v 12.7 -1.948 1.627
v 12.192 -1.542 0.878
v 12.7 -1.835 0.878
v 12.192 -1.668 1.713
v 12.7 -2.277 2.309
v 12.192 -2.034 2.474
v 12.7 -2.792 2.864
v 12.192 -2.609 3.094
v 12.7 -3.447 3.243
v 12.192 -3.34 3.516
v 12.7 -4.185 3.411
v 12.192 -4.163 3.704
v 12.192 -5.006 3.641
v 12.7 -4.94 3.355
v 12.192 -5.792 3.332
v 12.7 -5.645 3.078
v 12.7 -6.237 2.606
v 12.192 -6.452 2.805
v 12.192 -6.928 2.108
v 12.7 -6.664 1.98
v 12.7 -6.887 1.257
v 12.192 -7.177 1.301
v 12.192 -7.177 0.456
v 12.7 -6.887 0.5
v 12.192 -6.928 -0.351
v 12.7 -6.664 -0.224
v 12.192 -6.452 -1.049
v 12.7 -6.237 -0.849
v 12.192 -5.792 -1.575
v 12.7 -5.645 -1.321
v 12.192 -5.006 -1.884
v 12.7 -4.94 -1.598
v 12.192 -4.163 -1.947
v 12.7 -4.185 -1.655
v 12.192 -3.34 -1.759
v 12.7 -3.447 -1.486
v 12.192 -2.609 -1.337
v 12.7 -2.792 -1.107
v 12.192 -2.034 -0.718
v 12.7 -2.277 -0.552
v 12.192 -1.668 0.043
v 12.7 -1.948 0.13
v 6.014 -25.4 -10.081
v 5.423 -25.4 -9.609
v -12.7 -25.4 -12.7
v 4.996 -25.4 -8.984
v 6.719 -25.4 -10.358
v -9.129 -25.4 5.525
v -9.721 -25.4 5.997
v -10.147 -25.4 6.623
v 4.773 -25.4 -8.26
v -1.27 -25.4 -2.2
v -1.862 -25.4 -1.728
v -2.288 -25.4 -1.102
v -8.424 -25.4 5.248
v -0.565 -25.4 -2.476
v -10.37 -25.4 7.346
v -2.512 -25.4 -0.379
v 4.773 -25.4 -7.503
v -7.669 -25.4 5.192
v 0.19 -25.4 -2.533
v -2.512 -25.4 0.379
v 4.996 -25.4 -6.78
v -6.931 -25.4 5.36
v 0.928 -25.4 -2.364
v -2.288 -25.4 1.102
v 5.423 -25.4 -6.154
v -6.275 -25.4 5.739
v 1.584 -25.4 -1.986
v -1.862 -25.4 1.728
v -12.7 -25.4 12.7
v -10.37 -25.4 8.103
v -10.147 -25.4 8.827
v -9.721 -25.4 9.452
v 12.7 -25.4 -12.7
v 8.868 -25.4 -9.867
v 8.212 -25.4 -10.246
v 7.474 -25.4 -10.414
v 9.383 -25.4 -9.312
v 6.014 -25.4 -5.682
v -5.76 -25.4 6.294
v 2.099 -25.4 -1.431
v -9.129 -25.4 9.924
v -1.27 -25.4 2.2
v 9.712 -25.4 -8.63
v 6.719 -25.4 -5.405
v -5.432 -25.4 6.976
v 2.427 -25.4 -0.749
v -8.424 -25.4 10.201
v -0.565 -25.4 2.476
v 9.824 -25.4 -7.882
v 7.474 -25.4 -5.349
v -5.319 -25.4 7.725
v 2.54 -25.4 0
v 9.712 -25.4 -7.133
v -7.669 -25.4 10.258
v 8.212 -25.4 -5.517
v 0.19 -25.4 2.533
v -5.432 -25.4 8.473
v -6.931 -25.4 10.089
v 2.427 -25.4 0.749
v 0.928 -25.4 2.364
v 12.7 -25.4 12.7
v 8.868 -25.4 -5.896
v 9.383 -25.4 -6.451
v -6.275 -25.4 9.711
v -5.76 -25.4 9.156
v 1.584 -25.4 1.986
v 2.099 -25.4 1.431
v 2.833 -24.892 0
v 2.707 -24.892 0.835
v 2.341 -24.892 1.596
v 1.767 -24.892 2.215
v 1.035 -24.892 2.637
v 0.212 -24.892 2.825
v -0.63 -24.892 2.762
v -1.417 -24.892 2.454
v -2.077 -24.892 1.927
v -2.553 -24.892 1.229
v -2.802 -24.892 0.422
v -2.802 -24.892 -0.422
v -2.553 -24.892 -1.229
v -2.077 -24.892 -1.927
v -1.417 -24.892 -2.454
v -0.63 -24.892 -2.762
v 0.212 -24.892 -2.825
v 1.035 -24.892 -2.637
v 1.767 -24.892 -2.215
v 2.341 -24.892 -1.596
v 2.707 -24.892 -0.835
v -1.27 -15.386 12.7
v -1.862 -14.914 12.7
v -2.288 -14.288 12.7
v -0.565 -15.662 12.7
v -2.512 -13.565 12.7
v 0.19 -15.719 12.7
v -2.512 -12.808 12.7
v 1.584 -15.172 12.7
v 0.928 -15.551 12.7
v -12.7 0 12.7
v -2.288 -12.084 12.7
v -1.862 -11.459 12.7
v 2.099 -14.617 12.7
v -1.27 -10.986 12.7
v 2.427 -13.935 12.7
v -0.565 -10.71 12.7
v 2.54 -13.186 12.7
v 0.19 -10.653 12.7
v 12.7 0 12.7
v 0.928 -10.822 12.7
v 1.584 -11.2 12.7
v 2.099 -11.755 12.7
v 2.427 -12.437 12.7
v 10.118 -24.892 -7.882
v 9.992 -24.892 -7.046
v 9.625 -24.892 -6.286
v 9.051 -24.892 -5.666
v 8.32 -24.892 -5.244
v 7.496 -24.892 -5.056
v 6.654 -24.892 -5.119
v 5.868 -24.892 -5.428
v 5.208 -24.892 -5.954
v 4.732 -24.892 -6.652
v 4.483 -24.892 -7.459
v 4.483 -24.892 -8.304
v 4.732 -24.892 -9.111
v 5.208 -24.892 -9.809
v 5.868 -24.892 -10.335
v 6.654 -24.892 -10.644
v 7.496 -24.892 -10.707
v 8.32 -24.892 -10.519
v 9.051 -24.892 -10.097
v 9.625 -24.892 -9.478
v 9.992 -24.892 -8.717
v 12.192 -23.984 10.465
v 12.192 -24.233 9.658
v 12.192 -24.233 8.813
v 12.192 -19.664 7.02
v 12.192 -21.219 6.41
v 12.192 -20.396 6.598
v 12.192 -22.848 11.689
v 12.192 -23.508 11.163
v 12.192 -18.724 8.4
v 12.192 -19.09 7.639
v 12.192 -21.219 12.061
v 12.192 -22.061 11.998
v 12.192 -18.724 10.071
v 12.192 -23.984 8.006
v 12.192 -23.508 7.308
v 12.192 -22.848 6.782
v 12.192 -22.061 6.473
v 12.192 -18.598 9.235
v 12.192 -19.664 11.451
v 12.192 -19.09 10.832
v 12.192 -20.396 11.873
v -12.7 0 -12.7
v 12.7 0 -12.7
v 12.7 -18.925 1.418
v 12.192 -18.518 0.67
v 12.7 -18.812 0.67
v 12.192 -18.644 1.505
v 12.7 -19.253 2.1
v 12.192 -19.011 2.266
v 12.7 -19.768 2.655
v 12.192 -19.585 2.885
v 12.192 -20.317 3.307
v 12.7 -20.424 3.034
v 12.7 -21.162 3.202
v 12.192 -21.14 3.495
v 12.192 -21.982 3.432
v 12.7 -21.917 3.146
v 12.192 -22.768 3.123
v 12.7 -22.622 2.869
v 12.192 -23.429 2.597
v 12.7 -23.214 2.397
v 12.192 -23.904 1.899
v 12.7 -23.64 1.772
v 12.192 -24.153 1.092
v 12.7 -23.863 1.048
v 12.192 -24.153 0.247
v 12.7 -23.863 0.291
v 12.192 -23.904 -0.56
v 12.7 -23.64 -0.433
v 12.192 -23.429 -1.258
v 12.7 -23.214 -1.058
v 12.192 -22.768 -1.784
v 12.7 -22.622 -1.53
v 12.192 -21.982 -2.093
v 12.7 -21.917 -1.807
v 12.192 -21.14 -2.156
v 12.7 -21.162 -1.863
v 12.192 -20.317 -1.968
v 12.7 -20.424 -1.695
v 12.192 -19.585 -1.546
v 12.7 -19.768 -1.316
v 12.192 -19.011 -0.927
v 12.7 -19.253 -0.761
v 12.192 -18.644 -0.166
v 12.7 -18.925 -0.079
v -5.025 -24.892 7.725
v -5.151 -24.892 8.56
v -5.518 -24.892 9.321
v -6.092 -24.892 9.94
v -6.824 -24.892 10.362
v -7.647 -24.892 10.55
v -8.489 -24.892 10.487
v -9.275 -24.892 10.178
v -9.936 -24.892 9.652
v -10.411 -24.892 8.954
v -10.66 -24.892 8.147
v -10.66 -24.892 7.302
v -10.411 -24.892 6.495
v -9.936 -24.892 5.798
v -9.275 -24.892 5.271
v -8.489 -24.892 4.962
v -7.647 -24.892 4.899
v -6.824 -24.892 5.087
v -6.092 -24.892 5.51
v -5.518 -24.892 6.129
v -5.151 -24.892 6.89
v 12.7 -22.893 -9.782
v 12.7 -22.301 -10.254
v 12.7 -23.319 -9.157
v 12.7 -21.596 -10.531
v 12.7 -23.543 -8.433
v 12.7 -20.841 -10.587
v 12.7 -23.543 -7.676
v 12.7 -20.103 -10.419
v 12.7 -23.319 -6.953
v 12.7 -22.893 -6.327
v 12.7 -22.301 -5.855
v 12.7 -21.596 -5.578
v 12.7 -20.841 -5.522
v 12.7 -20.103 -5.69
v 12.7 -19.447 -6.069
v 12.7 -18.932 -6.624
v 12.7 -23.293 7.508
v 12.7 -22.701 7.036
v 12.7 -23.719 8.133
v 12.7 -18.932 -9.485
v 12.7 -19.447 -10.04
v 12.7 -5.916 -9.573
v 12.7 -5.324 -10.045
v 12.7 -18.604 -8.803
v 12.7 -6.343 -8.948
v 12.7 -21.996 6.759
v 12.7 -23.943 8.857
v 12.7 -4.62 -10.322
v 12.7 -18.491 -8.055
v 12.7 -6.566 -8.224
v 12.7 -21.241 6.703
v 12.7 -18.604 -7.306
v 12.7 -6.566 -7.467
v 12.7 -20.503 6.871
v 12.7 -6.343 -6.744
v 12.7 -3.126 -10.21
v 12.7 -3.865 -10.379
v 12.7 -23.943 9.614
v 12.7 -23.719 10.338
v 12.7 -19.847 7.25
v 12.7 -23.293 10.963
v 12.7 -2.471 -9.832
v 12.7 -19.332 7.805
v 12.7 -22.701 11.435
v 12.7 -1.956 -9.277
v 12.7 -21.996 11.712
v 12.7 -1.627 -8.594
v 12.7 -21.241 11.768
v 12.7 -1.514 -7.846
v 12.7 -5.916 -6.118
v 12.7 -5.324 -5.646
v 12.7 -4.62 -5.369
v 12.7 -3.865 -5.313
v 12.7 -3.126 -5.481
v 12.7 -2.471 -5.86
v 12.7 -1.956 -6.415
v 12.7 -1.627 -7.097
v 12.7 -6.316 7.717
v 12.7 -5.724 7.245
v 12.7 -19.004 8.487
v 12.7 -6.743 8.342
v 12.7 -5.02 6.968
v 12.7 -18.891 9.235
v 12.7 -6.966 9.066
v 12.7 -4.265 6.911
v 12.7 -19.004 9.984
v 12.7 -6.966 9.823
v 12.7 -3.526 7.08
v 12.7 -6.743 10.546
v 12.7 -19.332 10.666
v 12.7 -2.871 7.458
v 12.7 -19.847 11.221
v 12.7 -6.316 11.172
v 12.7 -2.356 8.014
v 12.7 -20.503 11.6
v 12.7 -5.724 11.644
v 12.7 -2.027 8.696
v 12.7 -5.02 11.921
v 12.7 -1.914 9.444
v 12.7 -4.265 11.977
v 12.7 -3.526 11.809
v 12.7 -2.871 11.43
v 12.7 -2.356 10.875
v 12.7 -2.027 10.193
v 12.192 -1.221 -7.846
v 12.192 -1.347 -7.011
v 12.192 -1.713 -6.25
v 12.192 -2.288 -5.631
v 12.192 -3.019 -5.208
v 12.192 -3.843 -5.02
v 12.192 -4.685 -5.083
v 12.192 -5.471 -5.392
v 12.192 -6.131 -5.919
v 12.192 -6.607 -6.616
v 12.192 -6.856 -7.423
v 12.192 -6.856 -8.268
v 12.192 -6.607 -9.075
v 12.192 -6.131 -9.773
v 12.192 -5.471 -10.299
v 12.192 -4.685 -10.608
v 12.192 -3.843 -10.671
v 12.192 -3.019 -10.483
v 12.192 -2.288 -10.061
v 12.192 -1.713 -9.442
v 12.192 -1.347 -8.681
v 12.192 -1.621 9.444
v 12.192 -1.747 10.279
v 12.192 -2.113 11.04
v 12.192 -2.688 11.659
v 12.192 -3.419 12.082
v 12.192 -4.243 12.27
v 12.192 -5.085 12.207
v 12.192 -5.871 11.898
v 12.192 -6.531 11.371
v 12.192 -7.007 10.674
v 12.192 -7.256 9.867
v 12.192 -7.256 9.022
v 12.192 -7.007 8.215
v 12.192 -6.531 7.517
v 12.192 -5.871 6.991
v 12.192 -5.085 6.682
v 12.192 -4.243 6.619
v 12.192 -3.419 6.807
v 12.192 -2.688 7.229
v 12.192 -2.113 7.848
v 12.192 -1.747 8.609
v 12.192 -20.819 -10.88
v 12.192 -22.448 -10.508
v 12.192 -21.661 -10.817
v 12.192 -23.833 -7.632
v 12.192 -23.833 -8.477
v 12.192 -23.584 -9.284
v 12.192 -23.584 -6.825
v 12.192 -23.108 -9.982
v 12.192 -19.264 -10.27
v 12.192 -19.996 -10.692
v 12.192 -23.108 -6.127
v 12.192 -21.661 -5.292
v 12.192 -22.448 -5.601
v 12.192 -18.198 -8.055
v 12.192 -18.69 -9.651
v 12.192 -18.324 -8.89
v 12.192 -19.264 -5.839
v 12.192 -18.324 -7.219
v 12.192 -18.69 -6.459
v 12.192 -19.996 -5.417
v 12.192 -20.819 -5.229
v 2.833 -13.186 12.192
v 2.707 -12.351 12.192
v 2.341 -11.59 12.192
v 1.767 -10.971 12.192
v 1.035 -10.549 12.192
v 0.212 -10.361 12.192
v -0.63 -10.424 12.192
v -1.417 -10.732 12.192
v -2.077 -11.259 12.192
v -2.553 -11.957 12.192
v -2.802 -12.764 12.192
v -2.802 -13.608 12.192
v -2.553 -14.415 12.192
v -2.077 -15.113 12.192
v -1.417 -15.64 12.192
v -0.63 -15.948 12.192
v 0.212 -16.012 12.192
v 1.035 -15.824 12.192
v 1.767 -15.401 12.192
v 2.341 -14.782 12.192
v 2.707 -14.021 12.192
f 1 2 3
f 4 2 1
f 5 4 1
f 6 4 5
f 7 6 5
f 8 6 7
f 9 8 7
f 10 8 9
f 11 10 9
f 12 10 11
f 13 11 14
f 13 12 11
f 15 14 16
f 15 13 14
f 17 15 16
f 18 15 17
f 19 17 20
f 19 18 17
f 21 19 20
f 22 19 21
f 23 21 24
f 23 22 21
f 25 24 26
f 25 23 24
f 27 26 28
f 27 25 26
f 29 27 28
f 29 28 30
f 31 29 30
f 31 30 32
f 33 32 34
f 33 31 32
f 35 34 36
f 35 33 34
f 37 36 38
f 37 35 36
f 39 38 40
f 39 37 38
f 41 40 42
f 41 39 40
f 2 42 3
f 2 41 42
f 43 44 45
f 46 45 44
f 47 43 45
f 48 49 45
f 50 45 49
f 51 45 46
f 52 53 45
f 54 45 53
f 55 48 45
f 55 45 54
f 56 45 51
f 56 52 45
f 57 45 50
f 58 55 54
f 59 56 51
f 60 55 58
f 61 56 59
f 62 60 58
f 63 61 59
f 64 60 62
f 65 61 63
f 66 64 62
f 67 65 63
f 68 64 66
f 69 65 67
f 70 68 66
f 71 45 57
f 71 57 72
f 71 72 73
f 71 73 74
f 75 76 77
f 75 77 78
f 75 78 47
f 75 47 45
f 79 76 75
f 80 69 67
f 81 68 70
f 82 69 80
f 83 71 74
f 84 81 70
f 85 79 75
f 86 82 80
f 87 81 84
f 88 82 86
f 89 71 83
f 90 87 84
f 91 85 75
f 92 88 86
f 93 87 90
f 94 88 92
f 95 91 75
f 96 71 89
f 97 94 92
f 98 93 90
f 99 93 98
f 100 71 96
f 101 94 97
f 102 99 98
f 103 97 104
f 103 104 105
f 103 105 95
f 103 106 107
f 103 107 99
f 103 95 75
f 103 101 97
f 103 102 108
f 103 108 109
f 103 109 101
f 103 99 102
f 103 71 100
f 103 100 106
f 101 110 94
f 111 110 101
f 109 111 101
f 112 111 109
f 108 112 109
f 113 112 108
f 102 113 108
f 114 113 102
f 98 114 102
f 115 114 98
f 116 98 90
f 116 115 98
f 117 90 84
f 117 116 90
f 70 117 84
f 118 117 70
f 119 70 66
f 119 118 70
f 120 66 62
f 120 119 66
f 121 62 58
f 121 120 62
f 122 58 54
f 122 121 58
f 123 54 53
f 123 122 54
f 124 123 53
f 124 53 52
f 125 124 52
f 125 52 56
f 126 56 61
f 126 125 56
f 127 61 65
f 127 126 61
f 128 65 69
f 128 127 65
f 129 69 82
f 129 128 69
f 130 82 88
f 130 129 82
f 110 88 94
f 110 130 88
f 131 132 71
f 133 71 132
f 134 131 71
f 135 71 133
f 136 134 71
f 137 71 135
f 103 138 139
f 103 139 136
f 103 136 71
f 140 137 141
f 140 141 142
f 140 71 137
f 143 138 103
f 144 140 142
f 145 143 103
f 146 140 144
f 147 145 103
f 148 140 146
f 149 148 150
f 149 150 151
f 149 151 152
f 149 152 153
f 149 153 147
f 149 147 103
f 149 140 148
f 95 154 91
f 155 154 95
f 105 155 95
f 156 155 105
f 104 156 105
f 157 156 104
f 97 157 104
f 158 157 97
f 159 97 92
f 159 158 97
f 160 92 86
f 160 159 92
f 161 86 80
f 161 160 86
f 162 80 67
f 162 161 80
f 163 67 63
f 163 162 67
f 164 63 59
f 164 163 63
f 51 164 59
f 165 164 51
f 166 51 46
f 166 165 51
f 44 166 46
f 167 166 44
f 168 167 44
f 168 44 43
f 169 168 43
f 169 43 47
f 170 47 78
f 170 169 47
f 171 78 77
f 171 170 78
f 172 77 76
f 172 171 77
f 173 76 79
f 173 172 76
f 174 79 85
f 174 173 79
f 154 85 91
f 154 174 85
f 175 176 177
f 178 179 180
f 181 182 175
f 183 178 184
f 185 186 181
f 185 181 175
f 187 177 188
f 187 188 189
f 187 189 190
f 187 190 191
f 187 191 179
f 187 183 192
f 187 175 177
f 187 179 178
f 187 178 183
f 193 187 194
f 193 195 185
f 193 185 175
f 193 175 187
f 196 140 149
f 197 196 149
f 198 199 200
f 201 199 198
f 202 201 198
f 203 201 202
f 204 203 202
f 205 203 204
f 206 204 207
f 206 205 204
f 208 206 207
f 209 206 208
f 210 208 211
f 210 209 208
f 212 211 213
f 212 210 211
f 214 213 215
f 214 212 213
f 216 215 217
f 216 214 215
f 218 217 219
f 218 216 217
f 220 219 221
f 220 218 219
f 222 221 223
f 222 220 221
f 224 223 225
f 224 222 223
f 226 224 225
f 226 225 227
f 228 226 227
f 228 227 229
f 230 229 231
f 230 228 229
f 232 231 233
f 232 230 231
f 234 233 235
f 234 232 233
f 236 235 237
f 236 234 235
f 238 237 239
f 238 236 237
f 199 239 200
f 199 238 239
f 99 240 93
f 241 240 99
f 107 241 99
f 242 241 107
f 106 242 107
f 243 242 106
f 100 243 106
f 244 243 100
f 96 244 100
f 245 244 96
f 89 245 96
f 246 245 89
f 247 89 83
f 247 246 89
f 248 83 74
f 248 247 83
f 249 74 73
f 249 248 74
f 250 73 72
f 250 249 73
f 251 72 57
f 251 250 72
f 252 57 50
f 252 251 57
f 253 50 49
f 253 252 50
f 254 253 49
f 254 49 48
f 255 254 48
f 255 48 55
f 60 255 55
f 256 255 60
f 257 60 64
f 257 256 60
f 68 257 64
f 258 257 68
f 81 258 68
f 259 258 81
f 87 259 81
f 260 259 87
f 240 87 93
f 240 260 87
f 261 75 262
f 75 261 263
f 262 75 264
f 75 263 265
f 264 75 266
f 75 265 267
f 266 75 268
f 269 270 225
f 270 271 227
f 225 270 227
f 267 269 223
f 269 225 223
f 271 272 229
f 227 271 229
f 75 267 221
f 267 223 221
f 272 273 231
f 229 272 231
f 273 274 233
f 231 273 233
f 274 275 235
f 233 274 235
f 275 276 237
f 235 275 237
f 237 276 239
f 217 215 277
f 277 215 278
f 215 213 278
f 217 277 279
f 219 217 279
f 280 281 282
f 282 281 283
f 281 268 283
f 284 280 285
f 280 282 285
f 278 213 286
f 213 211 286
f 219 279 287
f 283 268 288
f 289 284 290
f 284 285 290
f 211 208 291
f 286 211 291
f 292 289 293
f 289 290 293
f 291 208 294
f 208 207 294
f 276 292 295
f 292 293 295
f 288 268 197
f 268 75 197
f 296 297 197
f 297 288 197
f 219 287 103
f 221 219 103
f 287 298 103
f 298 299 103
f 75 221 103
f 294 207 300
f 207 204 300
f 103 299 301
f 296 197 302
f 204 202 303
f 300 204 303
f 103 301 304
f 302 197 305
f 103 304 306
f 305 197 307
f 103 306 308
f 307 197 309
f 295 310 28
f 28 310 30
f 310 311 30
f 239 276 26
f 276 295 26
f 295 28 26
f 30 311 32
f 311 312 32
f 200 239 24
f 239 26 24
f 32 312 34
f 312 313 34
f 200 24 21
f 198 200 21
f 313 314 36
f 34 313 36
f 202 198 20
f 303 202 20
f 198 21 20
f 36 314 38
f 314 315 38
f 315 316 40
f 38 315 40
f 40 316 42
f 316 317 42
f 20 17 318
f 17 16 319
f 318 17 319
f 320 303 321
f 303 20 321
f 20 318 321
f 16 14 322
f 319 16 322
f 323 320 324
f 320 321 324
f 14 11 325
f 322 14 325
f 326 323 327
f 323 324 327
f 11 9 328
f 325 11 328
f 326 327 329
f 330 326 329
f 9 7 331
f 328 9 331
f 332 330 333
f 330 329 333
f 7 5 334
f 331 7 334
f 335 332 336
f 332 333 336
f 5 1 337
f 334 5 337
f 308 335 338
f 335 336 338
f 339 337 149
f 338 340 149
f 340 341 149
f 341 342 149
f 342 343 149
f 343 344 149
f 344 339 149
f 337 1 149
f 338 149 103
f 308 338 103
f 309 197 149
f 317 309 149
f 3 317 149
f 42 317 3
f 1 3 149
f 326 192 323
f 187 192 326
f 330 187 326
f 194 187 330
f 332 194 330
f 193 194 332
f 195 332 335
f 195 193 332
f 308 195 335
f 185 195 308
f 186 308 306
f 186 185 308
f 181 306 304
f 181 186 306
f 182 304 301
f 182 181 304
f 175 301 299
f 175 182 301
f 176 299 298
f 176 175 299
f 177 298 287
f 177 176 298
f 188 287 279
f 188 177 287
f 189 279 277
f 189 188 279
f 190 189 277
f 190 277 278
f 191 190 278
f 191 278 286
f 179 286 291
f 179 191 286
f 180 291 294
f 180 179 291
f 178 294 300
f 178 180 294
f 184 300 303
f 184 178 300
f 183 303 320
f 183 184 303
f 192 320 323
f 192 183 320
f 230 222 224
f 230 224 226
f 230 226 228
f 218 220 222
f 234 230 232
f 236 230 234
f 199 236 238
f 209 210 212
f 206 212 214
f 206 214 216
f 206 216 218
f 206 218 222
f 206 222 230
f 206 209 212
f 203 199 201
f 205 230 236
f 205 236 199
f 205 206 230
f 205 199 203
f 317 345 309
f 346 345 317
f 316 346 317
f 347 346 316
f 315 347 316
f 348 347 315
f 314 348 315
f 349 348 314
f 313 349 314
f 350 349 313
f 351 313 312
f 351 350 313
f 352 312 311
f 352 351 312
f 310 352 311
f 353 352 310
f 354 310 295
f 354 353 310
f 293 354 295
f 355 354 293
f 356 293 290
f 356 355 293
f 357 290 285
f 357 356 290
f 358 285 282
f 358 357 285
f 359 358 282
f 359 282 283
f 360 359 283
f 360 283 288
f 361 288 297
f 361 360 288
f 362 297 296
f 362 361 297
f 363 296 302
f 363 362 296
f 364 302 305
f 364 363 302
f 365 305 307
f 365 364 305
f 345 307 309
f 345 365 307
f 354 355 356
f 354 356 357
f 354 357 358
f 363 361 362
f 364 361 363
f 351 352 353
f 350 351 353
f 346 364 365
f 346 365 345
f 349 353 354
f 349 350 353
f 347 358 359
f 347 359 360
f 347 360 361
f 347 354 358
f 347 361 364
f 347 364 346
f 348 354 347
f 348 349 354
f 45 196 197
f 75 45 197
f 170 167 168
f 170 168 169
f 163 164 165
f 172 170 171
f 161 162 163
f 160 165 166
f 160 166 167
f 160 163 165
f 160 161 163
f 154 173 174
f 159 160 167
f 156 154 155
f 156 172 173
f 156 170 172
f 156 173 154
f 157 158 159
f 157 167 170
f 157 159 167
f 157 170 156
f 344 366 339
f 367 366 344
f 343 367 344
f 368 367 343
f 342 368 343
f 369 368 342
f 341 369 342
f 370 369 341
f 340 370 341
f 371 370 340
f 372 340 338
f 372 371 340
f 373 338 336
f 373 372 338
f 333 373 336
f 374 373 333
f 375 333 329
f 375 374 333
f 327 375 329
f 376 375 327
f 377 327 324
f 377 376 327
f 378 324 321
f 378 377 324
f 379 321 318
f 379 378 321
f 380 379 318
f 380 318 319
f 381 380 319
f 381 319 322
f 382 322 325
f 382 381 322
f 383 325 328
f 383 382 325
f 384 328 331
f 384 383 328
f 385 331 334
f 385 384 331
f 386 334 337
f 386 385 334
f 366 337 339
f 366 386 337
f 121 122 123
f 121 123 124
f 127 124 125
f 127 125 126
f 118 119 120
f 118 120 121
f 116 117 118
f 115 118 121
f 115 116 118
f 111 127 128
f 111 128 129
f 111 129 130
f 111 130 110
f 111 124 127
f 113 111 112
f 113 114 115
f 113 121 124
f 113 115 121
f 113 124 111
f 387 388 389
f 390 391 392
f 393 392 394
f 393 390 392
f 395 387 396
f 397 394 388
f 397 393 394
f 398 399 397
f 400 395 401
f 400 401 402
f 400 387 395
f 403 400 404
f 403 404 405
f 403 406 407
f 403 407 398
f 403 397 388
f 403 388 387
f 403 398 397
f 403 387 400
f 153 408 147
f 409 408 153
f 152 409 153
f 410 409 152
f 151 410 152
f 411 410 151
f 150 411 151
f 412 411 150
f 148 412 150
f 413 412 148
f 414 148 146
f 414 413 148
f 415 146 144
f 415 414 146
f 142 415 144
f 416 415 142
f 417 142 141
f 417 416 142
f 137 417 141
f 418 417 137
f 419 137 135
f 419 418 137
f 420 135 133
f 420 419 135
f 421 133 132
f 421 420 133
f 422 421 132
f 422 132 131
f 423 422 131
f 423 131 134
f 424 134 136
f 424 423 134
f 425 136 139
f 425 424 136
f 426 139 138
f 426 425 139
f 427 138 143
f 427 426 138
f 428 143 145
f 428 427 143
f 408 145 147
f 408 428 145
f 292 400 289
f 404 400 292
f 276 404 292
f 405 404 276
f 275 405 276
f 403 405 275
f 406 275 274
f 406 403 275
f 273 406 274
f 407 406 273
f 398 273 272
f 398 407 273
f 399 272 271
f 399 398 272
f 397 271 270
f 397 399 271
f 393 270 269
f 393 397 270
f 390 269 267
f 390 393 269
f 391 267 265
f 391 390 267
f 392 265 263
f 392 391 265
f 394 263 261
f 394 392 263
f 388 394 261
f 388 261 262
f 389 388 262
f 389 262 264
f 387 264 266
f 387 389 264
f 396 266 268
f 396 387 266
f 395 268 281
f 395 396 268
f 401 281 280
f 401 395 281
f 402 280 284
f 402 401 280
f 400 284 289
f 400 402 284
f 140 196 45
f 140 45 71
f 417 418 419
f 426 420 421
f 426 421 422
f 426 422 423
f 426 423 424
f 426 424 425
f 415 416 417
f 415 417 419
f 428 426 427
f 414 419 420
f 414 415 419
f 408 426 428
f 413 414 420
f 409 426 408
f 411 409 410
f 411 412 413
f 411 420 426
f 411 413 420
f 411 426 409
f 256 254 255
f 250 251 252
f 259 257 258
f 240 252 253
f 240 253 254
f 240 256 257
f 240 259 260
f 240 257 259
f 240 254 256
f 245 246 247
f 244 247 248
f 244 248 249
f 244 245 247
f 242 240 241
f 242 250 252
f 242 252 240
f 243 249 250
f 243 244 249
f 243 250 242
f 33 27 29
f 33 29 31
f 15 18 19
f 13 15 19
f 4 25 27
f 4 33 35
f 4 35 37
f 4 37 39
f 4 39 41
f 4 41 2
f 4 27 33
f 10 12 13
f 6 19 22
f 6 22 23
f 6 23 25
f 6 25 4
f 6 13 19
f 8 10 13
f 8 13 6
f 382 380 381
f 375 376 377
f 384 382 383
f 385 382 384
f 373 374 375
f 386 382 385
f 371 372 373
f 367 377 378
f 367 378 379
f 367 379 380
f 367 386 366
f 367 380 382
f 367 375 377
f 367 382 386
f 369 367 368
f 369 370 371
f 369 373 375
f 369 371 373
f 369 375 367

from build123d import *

# Parameters (mm, degrees)
F0_W     = 25.4
F0_H     = 25.4
F1_DEPTH = 25.4
F2_R     = 2.54
F3_DEPTH = 0.508
F3_TAPER = -30
F4_R     = 2.54
F5_DEPTH = 0.508
F5_TAPER = -30
F6_R     = 2.54
F7_DEPTH = 0.508
F7_TAPER = -30


with BuildPart() as f1:
    # F0 (on Front) → F1 (new body)
    with BuildSketch(Plane.XZ):
        Rectangle(F0_W, F0_H)
    extrude(amount=F1_DEPTH)

    # F2 (on face) → F3 (cut)
    with BuildSketch(Plane.XY.offset(12.7)):
        with Locations((0, -13.1861664227)):
            Circle(F2_R)
    extrude(amount=-F3_DEPTH, taper=F3_TAPER, mode=Mode.SUBTRACT)

    # F4 (on face) → F5 (cut)
    with BuildSketch(Plane.XZ.offset(25.4)):
        with Locations((-7.8587181904, 7.7246704255)):
            Circle(F4_R)
        Circle(F4_R)
        with Locations((7.2844922543, -7.8815827146)):
            Circle(F4_R)
    extrude(amount=-F5_DEPTH, taper=F5_TAPER, mode=Mode.SUBTRACT)

    # F6 (on face) → F7 (cut)
    with BuildSketch(Plane.YZ.offset(12.7)):
        with Locations((-21.4310005392, 9.2354966214)):
            Circle(F6_R)
        with Locations((-21.3517151213, 0.6695195233)):
            Circle(F6_R)
        with Locations((-21.0309289396, -8.0545796081)):
            Circle(F6_R)
        with Locations((-4.4544605161, 9.4443410787)):
            Circle(F6_R)
        with Locations((-4.3751750982, 0.8783639806)):
            Circle(F6_R)
        with Locations((-4.0543889164, -7.8457351509)):
            Circle(F6_R)
    extrude(amount=-F7_DEPTH, taper=F7_TAPER, mode=Mode.SUBTRACT)


solid = f1.part
